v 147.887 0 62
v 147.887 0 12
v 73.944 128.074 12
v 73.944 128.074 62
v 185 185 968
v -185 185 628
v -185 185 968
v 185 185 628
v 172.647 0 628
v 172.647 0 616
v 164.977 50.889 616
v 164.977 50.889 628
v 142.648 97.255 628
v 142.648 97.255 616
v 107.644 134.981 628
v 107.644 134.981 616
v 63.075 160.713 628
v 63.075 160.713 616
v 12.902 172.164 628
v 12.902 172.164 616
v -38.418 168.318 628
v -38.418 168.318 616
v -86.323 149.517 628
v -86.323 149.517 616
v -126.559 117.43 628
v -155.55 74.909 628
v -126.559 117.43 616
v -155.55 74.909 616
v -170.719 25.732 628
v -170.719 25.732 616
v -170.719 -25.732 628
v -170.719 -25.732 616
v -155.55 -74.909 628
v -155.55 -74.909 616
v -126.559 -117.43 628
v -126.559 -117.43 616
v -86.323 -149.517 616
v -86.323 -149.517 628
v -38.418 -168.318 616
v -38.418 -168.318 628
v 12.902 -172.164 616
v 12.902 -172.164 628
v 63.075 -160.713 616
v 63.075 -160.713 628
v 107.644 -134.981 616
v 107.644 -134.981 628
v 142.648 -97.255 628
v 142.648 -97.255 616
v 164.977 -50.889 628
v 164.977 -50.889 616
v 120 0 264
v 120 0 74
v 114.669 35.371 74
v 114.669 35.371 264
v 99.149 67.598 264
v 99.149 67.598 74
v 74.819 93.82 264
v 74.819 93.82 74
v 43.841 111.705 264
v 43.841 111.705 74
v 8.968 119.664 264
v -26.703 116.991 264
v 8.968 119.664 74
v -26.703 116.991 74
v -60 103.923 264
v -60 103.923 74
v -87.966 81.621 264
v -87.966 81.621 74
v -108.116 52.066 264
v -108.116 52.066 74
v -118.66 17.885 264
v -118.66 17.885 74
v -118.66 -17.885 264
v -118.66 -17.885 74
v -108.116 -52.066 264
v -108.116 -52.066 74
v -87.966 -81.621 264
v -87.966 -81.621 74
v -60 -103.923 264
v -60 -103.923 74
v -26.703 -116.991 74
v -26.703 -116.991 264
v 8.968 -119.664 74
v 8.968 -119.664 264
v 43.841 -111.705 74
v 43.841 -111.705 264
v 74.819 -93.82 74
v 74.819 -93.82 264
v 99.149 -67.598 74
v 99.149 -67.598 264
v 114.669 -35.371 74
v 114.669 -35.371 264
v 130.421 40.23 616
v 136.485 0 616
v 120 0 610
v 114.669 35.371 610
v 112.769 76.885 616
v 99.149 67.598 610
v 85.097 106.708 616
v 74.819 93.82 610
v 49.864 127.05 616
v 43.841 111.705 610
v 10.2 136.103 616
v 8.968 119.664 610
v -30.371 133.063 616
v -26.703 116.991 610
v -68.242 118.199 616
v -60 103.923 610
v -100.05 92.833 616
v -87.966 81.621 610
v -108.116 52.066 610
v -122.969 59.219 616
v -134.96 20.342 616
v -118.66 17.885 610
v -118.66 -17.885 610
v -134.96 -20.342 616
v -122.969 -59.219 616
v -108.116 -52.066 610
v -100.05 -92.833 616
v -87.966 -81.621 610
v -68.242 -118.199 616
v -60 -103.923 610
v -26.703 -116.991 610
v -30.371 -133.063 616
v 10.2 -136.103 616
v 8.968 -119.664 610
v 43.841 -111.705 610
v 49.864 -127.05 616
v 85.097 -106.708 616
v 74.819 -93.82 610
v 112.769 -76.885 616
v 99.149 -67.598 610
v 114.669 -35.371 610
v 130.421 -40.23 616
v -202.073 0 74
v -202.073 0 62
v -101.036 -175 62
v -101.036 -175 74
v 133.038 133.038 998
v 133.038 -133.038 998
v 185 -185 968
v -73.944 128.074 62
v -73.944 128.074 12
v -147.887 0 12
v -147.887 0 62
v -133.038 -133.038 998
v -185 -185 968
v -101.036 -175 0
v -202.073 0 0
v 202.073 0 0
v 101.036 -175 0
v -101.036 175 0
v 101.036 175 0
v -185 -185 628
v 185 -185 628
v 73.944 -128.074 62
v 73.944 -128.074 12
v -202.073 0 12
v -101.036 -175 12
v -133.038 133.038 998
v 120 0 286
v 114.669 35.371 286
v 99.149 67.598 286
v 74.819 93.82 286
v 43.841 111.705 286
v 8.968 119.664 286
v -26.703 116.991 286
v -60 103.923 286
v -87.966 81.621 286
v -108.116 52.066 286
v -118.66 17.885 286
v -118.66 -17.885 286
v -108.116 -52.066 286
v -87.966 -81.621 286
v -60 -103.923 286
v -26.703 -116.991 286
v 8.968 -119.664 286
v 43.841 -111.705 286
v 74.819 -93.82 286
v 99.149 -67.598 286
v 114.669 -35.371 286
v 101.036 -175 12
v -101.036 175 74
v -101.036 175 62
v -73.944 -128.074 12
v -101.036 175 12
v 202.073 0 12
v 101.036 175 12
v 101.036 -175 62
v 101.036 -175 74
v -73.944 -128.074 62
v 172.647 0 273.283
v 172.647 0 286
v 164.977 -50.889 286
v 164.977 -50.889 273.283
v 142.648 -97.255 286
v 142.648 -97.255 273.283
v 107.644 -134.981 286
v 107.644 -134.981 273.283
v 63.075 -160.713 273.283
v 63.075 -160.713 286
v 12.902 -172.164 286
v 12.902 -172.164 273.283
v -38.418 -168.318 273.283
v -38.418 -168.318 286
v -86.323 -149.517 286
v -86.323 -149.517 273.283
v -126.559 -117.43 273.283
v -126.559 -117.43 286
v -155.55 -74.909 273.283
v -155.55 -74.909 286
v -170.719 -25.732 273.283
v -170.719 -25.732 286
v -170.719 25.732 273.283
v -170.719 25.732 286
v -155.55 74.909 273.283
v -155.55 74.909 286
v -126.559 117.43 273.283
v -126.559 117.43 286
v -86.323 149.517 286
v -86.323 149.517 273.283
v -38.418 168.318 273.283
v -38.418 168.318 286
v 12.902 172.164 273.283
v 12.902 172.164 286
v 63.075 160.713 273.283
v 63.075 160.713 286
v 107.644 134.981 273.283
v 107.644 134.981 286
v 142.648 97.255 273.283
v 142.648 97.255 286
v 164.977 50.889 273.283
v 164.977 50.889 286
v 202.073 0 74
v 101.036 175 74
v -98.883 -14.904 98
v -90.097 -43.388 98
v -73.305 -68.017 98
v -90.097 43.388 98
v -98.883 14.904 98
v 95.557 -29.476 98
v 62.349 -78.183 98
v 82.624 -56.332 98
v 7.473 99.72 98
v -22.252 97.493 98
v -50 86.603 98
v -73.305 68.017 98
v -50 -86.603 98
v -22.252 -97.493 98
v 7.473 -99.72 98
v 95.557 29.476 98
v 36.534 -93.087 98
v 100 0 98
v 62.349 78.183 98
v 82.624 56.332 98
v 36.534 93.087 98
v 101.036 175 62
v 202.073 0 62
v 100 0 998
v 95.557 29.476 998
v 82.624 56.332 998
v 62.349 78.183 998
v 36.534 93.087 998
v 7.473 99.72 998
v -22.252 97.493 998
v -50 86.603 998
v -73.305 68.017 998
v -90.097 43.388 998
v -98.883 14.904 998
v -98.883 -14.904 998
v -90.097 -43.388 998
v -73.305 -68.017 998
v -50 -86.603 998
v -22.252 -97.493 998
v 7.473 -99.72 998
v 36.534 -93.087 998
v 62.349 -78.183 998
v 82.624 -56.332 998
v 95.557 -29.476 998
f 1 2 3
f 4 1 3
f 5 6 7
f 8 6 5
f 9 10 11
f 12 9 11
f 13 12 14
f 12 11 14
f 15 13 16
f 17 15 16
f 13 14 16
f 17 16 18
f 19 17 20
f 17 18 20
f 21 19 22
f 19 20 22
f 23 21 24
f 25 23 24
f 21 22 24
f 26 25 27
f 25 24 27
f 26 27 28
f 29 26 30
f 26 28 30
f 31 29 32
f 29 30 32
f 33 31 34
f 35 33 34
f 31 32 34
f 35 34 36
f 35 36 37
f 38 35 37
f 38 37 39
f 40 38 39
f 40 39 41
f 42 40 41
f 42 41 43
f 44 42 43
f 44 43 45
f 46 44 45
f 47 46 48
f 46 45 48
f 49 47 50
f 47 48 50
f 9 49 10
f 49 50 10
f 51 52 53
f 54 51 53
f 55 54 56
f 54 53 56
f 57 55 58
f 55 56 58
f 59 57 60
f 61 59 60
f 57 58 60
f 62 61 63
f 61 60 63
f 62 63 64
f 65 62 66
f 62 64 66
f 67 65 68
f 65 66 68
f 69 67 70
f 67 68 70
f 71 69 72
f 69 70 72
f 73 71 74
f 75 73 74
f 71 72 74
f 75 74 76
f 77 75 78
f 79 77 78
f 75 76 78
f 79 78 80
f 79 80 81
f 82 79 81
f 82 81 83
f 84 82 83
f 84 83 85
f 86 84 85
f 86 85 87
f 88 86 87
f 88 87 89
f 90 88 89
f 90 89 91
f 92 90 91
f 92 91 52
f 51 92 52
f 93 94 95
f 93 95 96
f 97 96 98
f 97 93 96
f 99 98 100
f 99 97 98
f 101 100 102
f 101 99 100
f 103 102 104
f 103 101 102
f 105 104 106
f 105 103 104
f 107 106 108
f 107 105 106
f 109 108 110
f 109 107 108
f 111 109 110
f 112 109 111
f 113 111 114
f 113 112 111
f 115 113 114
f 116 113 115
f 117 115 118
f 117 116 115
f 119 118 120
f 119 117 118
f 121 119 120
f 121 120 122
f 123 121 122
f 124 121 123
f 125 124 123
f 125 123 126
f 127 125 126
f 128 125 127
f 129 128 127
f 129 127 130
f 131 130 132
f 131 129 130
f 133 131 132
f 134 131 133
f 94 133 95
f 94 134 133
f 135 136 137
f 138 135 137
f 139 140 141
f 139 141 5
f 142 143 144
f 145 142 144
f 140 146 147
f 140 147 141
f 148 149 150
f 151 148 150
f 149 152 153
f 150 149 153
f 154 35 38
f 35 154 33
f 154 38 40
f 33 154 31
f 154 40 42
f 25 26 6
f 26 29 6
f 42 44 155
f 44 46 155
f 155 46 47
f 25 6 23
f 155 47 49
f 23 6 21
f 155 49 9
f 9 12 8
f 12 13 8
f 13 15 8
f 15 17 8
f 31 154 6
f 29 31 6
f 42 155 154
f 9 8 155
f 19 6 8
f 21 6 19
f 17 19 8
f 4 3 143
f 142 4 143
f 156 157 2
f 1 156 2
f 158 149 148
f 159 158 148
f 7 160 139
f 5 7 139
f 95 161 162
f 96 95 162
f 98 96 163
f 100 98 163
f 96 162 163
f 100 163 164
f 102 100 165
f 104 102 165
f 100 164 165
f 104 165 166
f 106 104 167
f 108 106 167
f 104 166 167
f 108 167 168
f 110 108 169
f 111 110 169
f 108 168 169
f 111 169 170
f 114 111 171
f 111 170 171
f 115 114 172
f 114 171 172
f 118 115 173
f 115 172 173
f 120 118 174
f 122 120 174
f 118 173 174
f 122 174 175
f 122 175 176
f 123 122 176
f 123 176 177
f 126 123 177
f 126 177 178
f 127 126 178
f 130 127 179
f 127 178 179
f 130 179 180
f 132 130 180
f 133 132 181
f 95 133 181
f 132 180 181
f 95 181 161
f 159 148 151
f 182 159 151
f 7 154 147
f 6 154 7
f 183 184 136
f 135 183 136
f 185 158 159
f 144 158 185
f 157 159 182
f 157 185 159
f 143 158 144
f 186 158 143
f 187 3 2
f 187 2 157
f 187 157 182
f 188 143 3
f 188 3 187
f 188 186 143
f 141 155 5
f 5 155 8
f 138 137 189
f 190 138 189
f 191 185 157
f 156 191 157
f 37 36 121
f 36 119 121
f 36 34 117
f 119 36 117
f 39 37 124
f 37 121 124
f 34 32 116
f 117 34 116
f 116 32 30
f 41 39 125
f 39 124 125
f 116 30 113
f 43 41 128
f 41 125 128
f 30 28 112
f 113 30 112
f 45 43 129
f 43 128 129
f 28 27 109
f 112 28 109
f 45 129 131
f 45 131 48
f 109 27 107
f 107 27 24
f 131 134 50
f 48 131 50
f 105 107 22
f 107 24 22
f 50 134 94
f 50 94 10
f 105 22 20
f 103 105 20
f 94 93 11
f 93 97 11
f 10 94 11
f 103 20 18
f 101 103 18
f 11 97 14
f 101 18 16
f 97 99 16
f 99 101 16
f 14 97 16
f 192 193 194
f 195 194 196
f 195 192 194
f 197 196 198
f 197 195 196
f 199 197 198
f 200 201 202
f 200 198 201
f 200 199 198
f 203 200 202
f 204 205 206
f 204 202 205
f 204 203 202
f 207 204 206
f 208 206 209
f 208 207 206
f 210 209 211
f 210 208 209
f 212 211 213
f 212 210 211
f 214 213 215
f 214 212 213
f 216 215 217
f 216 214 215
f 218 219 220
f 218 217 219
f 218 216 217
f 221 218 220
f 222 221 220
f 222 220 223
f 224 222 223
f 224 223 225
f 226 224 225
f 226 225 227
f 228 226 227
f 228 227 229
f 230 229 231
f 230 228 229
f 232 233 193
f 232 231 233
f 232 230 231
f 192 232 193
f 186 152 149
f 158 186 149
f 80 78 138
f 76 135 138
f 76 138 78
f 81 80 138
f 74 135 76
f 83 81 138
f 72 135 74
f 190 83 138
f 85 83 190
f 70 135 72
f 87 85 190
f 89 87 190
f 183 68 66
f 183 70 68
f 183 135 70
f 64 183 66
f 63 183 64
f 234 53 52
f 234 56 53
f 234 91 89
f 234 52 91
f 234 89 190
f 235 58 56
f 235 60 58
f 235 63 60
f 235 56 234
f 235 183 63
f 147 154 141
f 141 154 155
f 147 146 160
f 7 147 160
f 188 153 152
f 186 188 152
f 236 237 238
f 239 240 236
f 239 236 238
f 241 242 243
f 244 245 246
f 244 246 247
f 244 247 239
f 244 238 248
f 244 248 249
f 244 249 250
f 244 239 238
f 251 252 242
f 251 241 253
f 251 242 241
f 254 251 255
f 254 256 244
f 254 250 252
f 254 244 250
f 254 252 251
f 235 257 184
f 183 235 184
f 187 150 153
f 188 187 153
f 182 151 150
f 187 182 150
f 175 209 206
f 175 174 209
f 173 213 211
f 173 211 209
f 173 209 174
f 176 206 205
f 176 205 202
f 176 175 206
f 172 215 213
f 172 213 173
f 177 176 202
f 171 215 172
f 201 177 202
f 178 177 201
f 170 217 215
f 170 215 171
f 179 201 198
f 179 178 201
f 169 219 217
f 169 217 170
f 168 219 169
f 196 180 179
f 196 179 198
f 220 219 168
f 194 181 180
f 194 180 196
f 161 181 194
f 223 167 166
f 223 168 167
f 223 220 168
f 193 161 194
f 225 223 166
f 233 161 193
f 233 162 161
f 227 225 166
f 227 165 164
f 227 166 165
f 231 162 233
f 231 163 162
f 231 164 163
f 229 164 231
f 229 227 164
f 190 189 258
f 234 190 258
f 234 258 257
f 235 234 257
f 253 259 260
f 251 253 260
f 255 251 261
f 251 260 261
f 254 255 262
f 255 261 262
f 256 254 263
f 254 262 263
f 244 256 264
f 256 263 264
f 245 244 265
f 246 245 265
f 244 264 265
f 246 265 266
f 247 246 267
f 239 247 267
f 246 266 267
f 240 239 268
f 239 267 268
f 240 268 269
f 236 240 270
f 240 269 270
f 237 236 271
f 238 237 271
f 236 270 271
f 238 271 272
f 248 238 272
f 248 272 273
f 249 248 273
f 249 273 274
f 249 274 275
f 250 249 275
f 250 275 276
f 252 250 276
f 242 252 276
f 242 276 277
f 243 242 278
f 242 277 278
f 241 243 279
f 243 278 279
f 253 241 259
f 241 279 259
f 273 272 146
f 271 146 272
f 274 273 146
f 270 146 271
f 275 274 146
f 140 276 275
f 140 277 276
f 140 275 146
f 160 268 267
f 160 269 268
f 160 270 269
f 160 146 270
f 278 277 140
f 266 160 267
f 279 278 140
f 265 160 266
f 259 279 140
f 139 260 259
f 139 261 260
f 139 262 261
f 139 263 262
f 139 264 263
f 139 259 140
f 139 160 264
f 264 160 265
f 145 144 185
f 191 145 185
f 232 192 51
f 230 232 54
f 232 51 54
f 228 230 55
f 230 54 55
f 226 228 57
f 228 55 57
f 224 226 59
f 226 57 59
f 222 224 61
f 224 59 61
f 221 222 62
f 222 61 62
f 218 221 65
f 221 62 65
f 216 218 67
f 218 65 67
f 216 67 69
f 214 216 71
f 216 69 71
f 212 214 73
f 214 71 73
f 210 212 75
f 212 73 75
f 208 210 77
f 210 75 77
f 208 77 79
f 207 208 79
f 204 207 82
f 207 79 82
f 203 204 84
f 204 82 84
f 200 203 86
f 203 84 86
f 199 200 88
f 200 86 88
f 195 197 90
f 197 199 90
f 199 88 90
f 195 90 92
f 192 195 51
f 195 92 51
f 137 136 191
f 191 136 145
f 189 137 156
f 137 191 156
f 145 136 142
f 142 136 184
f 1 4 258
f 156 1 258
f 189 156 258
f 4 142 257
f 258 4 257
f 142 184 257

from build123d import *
from OCP.BRepFilletAPI import BRepFilletAPI_MakeChamfer

# Parameters (mm, degrees)
BOSS_EXTRUDE1_DEPTH = 12
BOSS_EXTRUDE2_DEPTH = 50
BOSS_EXTRUDE3_DEPTH = 12
SKETCH4_R           = 120
BOSS_EXTRUDE4_DEPTH = 200
SKETCH5_R           = 172.646944325
BOSS_EXTRUDE5_DEPTH = 12
CHAMFER1_SIZE       = 56.712818196
CHAMFER1_SIZE_2     = 10
SKETCH6_R           = 120
BOSS_EXTRUDE6_DEPTH = 330
SKETCH8_R           = 172.646944325
BOSS_EXTRUDE7_DEPTH = 12
CHAMFER2_SIZE       = 6
CHAMFER2_SIZE2      = 16.484864517
SKETCH9_W           = 370
SKETCH9_H           = 370
BOSS_EXTRUDE8_DEPTH = 370
SKETCH10_R          = 100
CUT_EXTRUDE1_DEPTH  = 900
CHAMFER3_SIZE       = 30
CHAMFER3_SIZE2      = 51.961524227


with BuildPart() as part:
    # Sketch1 → Boss-Extrude1 (new body)
    with BuildSketch(Plane.XY):
        Polygon((202.072594216, 0), (101.036297108, 175), (-101.036297108, 175), (-202.072594216, 0), (-101.036297108, -175), (101.036297108, -175), align=None)
    extrude(amount=BOSS_EXTRUDE1_DEPTH)

    # Sketch2 → Boss-Extrude2 (add)
    with BuildSketch(Plane.XY.offset(12)):
        Polygon((147.887498821, 0), (73.943749411, 128.074330881), (-73.943749411, 128.074330881), (-147.887498821, 0), (-73.943749411, -128.074330881), (73.943749411, -128.074330881), align=None)
    extrude(amount=BOSS_EXTRUDE2_DEPTH)

    # Sketch3 → Boss-Extrude3 (add)
    with BuildSketch(Plane.XY.offset(62)):
        Polygon((202.072594216, 0), (101.036297108, 175), (-101.036297108, 175), (-202.072594216, 0), (-101.036297108, -175), (101.036297108, -175), align=None)
    extrude(amount=BOSS_EXTRUDE3_DEPTH)

    # Sketch4 → Boss-Extrude4 (add)
    with BuildSketch(Plane.XY.offset(74)):
        Circle(SKETCH4_R)
    extrude(amount=BOSS_EXTRUDE4_DEPTH)

    # Sketch5 → Boss-Extrude5 (add)
    with BuildSketch(Plane.XY.offset(274)):
        Circle(SKETCH5_R)
    extrude(amount=BOSS_EXTRUDE5_DEPTH)

    # Chamfer1
    # the kernel refuses this chamfer: 56.712818196, 10 mm, written as the material it adds along each edge
    with BuildSketch(Plane(origin=(0, 0, 274), x_dir=(1, 0, 0), z_dir=(0, -1, 0))) as chamfer1_piece_1_section:
        Polygon((120 + CHAMFER1_SIZE, 0), (120, -CHAMFER1_SIZE_2), (120, 0), align=None)
    chamfer1_piece_1 = revolve(axis=Axis((0, 0, 274), (0, 0, 1)), mode=Mode.PRIVATE)
    chamfer1_piece_1 = chamfer1_piece_1 & Plane(origin=(0, 0, 269.114385433), x_dir=(1, 0, 0), z_dir=(0, 0, -1)) * Cylinder(172.646944325, 707, mode=Mode.PRIVATE)
    add(chamfer1_piece_1)

    # Sketch6 → Boss-Extrude6 (add)
    with BuildSketch(Plane.XY.offset(286)):
        Circle(SKETCH6_R)
    extrude(amount=BOSS_EXTRUDE6_DEPTH)

    # Sketch8 → Boss-Extrude7 (add)
    with BuildSketch(Plane.XY.offset(616)):
        Circle(SKETCH8_R)
    extrude(amount=BOSS_EXTRUDE7_DEPTH)

    # Chamfer2
    chamfer2_edges = [part.edges().sort_by_distance(p)[0] for p in [
        (-120, 0, 616),
    ]]
    chamfer2_side = [part.faces().sort_by_distance(p)[0] for p in [
        (-120, 0, 451),
    ]]
    chamfer(chamfer2_edges, length=CHAMFER2_SIZE, length2=CHAMFER2_SIZE2, reference=chamfer2_side[0])

    # Sketch9 → Boss-Extrude8 (add)
    with BuildSketch(Plane.XY.offset(628)):
        Rectangle(SKETCH9_W, SKETCH9_H)
    extrude(amount=BOSS_EXTRUDE8_DEPTH)

    # Sketch10 → Cut-Extrude1 (cut)
    with BuildSketch(Plane.XY.offset(998)):
        Circle(SKETCH10_R)
    extrude(amount=-CUT_EXTRUDE1_DEPTH, mode=Mode.SUBTRACT)

    # Chamfer3: one chamfer whose edges measure the first distance from different faces: ONE call of the kernel's chamfer builder (chamfer() names one face for all edges)
    chamfer3_edges_1 = [part.edges().sort_by_distance(p)[0] for p in [
        (185, 0, 998),
    ]]
    chamfer3_side_1 = [part.faces().sort_by_distance(p)[0] for p in [
        (185, 0, 813),
    ]]
    chamfer3_edges_2 = [part.edges().sort_by_distance(p)[0] for p in [
        (0, 185, 998),
    ]]
    chamfer3_side_2 = [part.faces().sort_by_distance(p)[0] for p in [
        (0, 185, 813),
    ]]
    chamfer3_edges_3 = [part.edges().sort_by_distance(p)[0] for p in [
        (-185, 0, 998),
    ]]
    chamfer3_side_3 = [part.faces().sort_by_distance(p)[0] for p in [
        (-185, 0, 813),
    ]]
    chamfer3_edges_4 = [part.edges().sort_by_distance(p)[0] for p in [
        (0, -185, 998),
    ]]
    chamfer3_side_4 = [part.faces().sort_by_distance(p)[0] for p in [
        (0, -185, 813),
    ]]
    chamfer3 = BRepFilletAPI_MakeChamfer(part.part.solid().wrapped)
    for e in chamfer3_edges_1:
        chamfer3.Add(CHAMFER3_SIZE, CHAMFER3_SIZE2, e.wrapped, chamfer3_side_1[0].wrapped)  # the first distance lies on this face
    for e in chamfer3_edges_2:
        chamfer3.Add(CHAMFER3_SIZE, CHAMFER3_SIZE2, e.wrapped, chamfer3_side_2[0].wrapped)  # the first distance lies on this face
    for e in chamfer3_edges_3:
        chamfer3.Add(CHAMFER3_SIZE, CHAMFER3_SIZE2, e.wrapped, chamfer3_side_3[0].wrapped)  # the first distance lies on this face
    for e in chamfer3_edges_4:
        chamfer3.Add(CHAMFER3_SIZE, CHAMFER3_SIZE2, e.wrapped, chamfer3_side_4[0].wrapped)  # the first distance lies on this face
    add(Compound.cast(chamfer3.Shape()), mode=Mode.REPLACE)


solid = part.part
